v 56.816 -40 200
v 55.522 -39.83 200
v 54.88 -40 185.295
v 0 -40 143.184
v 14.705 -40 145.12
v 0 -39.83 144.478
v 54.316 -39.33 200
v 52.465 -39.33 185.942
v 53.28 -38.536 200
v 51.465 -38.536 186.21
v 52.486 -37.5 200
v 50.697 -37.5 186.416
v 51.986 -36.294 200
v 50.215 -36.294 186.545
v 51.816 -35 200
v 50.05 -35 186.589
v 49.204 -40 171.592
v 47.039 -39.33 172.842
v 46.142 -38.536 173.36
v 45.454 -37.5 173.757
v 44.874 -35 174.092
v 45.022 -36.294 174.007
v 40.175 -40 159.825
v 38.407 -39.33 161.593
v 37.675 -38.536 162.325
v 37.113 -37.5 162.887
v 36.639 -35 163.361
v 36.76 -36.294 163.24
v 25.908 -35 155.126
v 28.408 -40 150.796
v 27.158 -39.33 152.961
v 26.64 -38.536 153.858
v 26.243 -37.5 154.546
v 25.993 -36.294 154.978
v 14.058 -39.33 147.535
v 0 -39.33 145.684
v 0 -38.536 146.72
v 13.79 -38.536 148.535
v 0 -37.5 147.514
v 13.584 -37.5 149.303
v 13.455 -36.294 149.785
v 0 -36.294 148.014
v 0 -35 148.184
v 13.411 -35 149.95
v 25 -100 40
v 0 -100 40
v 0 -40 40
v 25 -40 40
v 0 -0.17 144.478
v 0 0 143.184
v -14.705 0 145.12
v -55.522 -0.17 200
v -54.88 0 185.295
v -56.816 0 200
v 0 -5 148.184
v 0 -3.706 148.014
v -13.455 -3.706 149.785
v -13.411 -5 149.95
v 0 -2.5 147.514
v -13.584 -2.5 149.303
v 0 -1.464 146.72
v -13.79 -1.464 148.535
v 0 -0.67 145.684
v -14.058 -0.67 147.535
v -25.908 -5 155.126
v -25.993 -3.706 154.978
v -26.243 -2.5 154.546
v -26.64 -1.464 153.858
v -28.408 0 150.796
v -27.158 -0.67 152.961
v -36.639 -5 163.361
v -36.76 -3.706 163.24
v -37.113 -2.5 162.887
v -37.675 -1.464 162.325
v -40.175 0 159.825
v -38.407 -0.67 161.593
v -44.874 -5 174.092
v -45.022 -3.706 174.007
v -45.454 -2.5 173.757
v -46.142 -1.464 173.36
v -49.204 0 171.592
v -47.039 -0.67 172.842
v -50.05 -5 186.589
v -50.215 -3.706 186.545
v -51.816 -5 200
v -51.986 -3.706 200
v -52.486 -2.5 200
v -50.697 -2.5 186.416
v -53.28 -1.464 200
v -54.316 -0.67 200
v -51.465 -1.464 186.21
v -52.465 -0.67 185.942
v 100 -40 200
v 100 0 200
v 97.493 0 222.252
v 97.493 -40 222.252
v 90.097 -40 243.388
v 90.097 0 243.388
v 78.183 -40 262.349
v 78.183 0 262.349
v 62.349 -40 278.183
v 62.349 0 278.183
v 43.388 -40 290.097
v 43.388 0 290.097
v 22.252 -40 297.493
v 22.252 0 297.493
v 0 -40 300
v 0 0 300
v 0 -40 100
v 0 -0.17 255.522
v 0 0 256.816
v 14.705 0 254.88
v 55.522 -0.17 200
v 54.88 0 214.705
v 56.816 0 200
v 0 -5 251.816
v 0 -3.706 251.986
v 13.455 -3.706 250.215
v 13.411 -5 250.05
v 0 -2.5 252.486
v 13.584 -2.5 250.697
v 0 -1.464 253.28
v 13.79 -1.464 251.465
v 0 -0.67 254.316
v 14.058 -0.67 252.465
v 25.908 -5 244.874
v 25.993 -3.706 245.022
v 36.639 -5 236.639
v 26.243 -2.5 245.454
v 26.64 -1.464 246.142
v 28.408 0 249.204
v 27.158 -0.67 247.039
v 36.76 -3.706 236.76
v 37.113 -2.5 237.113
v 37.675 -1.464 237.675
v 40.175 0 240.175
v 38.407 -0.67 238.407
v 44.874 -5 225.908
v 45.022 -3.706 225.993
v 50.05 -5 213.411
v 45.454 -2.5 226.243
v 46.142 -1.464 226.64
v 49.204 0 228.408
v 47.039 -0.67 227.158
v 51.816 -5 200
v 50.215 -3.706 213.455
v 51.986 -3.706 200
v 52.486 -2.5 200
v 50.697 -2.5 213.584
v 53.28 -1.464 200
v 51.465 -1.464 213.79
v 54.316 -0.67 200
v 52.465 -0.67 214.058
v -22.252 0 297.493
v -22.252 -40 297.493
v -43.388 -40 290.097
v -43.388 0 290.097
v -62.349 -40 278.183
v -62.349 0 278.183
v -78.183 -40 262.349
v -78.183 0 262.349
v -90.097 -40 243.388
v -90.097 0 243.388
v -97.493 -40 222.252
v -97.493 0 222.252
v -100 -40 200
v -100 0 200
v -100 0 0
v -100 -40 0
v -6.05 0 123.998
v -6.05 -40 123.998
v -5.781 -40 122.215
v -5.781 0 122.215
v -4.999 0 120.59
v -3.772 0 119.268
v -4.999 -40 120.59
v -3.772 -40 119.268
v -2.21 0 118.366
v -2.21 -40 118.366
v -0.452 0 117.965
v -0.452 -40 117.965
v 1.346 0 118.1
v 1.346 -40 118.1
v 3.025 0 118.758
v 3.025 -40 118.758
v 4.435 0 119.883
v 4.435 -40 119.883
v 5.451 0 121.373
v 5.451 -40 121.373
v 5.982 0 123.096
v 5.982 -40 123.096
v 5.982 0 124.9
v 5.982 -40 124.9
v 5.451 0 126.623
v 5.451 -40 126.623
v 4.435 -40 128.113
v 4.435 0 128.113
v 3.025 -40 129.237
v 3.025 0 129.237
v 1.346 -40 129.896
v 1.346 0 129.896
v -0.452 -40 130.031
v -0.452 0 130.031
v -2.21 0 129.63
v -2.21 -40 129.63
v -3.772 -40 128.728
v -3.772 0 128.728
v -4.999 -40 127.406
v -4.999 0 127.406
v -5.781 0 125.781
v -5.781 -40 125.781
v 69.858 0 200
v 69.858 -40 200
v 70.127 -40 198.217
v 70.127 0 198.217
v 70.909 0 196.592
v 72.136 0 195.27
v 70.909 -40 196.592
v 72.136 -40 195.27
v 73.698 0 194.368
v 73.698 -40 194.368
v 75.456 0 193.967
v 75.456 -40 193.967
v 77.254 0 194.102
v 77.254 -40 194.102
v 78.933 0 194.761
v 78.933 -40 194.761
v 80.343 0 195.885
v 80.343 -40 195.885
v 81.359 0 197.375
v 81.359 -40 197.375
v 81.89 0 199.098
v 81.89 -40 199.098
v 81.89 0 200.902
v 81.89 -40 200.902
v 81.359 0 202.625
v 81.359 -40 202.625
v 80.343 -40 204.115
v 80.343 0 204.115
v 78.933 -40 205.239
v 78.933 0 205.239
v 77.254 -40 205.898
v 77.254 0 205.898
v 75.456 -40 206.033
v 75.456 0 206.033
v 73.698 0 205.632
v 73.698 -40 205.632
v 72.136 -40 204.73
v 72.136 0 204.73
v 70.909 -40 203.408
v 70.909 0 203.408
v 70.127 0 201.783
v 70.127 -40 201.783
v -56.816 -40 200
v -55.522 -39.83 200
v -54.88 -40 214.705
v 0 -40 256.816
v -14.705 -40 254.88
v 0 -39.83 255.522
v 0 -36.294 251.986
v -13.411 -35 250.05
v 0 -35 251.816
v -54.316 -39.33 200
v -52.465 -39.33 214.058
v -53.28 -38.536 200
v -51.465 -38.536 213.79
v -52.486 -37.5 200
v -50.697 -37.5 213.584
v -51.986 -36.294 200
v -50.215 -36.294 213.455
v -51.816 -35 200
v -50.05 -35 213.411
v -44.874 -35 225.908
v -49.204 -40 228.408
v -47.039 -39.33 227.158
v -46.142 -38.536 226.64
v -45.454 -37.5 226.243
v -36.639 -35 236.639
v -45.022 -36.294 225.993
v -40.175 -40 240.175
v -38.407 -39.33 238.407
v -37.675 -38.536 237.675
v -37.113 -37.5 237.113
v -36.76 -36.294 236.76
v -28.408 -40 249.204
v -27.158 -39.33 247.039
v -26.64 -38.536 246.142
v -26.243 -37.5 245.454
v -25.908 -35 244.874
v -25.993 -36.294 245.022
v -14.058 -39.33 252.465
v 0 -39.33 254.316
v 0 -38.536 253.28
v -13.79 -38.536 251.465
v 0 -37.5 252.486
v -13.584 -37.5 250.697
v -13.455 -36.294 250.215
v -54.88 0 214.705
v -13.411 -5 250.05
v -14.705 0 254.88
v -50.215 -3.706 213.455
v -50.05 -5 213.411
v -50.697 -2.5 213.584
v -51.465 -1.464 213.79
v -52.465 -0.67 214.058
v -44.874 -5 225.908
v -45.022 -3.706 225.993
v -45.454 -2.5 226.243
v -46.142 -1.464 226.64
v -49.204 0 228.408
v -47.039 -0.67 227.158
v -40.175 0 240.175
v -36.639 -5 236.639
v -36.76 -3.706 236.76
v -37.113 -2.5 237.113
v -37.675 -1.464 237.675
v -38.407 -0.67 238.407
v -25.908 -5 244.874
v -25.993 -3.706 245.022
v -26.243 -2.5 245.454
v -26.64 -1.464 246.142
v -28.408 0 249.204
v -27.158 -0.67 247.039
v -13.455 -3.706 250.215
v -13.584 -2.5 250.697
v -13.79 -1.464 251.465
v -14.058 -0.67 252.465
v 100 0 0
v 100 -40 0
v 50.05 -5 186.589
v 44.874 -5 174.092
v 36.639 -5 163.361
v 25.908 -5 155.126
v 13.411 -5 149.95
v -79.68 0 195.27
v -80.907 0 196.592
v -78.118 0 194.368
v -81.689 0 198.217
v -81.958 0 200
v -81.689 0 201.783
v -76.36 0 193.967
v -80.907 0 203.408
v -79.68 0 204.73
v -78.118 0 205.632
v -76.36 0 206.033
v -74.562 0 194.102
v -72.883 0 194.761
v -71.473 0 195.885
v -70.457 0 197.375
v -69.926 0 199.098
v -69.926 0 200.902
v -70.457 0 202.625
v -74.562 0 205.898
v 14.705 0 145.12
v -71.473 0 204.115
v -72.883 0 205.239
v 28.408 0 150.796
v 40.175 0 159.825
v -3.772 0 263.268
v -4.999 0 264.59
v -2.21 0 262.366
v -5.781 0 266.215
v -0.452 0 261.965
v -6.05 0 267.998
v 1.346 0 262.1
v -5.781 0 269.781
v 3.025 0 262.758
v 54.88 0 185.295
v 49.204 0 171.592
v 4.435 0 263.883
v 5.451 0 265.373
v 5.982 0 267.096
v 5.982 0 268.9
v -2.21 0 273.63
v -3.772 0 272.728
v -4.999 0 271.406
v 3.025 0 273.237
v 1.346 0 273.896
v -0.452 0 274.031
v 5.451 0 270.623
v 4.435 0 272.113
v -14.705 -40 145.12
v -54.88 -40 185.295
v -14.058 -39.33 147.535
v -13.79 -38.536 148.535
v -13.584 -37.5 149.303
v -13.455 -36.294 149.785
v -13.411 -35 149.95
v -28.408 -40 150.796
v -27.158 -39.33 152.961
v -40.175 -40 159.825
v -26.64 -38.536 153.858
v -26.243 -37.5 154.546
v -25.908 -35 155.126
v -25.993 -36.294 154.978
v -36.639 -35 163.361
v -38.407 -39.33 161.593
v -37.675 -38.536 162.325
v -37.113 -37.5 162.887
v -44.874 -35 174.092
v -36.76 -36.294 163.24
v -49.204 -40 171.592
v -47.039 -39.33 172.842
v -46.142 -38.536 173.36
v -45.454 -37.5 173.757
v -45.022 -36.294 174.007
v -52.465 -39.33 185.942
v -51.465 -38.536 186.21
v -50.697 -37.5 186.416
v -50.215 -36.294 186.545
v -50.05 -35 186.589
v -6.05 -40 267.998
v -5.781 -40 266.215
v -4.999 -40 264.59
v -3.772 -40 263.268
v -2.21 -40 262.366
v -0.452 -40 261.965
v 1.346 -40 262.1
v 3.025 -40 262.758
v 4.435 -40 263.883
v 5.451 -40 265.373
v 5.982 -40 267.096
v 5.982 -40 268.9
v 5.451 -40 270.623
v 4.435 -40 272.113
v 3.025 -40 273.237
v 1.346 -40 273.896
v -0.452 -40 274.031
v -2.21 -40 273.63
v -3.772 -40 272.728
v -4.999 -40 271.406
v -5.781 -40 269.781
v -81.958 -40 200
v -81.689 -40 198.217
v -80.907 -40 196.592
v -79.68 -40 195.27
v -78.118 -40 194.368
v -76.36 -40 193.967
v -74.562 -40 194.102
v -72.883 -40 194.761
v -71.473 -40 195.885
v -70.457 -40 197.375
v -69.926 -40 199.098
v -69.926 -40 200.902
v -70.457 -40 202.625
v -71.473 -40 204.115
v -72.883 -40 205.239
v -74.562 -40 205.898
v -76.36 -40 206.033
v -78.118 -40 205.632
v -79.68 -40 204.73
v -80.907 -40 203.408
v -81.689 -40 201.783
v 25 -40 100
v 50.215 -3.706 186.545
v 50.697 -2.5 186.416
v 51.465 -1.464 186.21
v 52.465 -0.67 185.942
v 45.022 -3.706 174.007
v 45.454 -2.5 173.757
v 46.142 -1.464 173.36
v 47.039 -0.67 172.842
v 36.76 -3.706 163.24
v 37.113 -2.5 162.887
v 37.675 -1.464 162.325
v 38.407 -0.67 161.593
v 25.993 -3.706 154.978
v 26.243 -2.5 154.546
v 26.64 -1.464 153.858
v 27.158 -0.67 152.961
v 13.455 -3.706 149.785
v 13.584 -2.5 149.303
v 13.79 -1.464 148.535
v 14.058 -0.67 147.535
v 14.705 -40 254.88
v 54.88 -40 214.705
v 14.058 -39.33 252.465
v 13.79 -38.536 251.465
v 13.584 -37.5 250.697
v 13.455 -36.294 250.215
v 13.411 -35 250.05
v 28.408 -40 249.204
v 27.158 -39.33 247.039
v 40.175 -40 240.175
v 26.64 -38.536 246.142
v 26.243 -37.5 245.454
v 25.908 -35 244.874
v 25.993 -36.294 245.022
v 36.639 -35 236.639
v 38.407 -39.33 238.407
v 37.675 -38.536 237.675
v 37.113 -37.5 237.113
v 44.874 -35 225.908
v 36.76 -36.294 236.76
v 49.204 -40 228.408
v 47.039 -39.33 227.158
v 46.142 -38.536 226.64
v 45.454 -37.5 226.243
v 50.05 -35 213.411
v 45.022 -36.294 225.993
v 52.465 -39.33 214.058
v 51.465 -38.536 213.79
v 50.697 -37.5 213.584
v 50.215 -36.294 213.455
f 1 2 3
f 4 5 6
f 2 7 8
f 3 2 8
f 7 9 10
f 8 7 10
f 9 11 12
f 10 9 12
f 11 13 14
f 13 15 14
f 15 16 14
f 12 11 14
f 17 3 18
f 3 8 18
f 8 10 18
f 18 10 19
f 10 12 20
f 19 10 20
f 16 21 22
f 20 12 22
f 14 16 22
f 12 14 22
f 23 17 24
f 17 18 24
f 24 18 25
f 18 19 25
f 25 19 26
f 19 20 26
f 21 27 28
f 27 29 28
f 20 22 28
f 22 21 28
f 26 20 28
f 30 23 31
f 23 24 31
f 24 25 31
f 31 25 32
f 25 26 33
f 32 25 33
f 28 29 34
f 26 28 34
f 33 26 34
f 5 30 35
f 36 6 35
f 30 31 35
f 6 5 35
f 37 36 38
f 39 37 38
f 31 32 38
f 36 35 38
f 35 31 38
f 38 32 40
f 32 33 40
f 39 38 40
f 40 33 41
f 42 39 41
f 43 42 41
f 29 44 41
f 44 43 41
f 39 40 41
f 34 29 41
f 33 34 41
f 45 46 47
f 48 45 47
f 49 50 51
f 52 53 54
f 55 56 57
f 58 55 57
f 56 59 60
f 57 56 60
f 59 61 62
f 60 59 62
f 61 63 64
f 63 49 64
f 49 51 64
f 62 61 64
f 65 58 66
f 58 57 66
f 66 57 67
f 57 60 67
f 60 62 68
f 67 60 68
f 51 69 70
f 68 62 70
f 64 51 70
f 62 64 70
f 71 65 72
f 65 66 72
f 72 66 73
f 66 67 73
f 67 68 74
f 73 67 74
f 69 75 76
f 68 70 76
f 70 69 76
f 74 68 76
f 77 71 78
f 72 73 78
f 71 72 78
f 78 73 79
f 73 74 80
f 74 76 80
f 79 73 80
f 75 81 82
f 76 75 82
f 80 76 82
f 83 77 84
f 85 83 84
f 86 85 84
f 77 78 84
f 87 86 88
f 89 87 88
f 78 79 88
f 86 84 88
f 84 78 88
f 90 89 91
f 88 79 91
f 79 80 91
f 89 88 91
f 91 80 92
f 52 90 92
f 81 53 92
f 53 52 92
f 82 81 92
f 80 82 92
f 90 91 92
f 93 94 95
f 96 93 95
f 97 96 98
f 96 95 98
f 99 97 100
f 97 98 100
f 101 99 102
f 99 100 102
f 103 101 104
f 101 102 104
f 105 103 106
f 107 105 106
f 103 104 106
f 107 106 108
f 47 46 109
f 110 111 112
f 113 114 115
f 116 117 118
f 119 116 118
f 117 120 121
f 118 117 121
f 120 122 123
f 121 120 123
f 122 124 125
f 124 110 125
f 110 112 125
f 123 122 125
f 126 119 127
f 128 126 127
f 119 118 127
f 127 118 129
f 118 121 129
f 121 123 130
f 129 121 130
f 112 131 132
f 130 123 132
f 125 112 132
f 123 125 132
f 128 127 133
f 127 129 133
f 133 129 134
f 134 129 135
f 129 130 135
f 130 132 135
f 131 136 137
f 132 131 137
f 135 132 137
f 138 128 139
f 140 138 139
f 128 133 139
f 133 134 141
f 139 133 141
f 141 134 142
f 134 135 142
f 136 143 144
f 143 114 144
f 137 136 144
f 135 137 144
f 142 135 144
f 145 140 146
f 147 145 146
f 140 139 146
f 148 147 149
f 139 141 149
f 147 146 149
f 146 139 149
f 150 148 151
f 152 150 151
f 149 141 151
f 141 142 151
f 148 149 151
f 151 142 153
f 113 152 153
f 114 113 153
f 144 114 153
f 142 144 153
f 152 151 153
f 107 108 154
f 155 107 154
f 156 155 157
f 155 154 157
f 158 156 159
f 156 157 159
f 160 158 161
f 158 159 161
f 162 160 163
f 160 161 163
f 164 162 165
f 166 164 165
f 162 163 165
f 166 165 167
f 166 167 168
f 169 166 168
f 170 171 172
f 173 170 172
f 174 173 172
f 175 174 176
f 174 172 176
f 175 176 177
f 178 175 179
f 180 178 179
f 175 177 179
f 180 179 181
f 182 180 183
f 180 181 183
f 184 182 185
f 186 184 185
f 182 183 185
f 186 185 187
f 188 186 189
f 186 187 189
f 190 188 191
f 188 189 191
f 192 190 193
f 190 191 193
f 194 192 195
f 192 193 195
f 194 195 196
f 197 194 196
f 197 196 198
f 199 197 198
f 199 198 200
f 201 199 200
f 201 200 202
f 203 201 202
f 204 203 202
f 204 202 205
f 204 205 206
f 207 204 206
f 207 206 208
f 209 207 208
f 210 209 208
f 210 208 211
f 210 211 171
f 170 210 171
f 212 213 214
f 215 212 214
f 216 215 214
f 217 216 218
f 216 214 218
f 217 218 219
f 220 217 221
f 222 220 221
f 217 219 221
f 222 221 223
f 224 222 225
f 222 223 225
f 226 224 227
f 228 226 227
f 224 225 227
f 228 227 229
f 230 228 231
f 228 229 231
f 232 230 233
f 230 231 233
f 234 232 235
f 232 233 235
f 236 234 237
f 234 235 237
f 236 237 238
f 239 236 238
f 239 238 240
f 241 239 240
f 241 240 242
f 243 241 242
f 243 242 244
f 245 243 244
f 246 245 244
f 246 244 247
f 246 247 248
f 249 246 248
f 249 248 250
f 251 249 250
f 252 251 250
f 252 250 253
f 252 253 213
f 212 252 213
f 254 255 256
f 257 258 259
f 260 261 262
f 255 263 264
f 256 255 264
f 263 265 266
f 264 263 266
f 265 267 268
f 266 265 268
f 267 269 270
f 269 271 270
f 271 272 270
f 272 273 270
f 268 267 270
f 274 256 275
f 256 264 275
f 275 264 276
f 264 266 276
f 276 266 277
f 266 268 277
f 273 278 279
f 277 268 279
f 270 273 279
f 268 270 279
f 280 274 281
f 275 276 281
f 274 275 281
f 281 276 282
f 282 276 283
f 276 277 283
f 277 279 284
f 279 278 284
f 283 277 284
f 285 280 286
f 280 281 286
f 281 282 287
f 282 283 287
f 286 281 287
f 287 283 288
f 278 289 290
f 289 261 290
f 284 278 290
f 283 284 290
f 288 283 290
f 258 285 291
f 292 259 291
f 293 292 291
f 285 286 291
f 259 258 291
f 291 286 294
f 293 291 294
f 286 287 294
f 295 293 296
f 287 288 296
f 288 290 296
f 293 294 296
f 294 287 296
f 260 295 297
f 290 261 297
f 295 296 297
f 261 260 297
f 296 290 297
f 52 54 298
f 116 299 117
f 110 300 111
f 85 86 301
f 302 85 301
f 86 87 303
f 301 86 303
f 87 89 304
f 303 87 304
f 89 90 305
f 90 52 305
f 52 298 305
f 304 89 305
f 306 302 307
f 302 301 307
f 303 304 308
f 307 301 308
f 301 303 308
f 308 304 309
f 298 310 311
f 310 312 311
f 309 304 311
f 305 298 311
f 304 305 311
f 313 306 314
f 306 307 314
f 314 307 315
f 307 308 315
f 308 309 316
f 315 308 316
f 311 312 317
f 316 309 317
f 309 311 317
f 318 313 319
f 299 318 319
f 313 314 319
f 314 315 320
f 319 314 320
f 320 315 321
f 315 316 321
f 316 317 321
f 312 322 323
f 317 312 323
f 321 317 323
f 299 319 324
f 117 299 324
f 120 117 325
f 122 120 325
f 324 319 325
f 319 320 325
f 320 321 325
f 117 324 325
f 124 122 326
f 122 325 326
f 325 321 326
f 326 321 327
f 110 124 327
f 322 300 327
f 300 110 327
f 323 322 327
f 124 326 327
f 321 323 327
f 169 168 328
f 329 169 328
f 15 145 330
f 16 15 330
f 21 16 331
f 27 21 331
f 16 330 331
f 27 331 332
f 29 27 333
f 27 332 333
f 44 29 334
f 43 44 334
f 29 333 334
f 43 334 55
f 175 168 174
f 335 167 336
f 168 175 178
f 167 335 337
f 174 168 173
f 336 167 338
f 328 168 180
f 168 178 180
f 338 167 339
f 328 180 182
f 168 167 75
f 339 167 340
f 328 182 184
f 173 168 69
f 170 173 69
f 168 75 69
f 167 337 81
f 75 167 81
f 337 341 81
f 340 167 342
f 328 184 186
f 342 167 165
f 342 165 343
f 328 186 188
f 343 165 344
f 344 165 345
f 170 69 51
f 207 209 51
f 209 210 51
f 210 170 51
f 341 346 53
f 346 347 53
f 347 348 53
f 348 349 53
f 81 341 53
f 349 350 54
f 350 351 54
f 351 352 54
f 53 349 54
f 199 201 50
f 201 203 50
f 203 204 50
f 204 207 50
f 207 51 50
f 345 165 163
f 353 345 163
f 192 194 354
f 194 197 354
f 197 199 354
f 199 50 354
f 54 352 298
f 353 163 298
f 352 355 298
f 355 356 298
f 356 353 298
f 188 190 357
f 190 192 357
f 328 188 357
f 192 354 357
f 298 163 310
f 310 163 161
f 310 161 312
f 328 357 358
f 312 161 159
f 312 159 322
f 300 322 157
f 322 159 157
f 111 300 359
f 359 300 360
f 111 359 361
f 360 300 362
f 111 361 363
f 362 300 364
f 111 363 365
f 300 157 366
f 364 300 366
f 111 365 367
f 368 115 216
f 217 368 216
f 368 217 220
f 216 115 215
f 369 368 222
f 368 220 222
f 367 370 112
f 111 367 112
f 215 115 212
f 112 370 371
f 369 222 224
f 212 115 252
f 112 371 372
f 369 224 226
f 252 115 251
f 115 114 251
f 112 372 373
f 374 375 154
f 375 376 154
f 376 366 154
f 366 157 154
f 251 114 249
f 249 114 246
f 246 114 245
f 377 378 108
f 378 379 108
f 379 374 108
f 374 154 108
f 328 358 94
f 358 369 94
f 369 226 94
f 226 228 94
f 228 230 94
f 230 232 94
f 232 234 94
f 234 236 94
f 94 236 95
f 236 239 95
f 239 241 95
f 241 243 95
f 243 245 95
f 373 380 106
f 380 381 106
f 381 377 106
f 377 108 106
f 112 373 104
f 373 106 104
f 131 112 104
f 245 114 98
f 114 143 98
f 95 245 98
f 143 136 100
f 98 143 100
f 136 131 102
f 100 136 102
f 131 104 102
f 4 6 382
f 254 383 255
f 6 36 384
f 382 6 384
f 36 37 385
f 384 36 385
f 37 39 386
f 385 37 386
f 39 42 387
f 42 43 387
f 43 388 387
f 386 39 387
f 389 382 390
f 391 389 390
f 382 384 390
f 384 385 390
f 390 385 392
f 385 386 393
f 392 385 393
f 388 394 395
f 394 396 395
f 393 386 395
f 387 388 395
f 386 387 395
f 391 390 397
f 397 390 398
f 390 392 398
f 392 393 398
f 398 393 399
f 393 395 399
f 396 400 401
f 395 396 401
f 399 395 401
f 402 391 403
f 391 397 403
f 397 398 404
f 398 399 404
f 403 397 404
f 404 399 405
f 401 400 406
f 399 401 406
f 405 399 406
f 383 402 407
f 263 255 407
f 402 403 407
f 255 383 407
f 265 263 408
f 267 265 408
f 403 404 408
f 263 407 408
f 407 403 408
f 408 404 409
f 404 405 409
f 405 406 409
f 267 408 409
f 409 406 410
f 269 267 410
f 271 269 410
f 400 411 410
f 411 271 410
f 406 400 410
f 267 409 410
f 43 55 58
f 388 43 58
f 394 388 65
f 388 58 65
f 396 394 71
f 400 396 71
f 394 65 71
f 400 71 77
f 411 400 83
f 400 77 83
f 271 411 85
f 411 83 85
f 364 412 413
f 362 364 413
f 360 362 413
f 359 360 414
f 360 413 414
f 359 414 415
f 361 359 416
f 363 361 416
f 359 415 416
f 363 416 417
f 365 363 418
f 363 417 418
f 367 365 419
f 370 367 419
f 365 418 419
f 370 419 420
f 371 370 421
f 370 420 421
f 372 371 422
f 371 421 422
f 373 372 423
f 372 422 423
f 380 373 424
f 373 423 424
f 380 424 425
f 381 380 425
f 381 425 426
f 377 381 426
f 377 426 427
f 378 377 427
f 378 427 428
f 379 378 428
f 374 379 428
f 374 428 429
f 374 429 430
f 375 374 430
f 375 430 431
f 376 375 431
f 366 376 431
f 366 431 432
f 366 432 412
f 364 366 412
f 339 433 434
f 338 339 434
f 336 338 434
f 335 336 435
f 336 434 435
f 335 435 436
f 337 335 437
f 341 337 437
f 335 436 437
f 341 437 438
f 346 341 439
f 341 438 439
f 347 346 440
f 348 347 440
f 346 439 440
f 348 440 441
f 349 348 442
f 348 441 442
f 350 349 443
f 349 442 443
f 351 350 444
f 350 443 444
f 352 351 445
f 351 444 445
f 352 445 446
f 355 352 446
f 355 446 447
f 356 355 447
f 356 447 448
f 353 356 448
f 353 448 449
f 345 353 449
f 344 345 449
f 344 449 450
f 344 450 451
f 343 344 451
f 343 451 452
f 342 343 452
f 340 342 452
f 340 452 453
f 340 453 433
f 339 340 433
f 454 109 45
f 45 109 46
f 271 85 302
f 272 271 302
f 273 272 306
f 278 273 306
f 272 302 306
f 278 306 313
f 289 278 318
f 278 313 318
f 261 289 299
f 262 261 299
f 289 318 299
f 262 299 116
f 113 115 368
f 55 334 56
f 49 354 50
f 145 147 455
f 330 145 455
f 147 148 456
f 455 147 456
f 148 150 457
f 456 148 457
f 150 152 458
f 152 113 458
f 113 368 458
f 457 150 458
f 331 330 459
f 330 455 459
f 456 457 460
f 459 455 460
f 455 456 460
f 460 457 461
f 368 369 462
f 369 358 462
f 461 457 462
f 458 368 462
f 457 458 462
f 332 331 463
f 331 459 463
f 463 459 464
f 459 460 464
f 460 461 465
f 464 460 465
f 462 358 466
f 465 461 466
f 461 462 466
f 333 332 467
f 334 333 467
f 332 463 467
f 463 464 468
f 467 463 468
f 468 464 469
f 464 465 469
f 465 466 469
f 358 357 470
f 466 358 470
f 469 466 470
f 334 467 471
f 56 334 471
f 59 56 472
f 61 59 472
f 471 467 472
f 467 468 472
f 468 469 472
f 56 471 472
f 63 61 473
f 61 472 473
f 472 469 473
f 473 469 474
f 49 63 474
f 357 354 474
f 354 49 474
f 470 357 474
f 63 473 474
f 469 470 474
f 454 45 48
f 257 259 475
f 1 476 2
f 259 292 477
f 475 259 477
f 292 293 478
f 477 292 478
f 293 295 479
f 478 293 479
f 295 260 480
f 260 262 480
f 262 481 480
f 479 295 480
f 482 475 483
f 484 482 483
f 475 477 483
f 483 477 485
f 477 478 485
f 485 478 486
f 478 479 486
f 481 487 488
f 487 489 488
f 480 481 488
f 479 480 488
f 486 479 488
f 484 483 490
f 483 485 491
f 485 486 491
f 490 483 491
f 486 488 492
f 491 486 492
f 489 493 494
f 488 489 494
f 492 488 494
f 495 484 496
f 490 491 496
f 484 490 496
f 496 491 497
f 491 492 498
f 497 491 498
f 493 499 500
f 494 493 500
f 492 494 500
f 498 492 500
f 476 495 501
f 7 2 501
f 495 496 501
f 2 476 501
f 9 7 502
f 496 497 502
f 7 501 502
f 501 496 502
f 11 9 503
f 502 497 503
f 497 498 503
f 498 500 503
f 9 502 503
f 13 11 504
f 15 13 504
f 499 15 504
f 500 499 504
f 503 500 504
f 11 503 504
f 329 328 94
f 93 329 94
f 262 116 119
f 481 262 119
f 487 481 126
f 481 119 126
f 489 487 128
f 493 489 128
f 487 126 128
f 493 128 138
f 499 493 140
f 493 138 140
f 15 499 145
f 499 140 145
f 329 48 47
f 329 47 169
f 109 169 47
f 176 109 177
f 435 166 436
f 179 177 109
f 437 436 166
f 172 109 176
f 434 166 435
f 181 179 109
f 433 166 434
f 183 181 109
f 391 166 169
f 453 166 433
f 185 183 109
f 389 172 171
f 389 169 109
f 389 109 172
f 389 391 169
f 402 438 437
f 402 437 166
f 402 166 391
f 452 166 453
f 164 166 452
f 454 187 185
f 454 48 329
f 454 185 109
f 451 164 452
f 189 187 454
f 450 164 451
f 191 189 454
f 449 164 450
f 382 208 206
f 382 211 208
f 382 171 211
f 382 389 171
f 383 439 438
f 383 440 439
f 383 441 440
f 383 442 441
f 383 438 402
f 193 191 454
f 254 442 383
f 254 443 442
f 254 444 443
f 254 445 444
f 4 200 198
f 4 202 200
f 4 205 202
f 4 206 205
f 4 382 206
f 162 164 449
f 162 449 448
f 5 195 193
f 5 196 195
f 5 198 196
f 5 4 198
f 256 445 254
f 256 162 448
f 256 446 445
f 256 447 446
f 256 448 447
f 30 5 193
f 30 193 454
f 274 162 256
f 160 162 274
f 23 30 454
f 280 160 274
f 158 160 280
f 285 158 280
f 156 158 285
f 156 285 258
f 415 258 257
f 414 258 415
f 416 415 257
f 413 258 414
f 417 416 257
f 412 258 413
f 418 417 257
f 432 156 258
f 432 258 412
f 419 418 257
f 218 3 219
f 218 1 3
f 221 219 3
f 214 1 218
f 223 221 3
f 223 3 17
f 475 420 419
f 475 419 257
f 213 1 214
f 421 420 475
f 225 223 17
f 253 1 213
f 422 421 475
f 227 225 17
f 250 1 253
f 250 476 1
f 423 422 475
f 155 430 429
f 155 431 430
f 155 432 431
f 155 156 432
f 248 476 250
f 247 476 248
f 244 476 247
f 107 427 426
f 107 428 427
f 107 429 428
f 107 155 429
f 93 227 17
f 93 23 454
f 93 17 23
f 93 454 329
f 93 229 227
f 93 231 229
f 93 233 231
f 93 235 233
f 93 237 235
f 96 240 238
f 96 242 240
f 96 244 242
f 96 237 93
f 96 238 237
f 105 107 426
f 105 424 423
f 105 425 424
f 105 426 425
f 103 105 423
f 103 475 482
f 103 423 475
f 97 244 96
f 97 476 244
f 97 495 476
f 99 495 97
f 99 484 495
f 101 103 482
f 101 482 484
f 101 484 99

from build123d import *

# Parameters (mm, degrees)
F1_DEPTH = 40
F2_D     = 12.1
F3_R     = 5
F4_R     = 5
F6_DEPTH = 25


with BuildPart() as f1:
    # F0 (on Front) → F1 (new body)
    with BuildSketch(Plane.XZ):
        with BuildLine():
            Line((-100, 0), (0, 0))
            Line((0, 0), (0, 100))
            ThreePointArc((0, 100), (-70.7106781187, 129.2893218813), (-100, 200))
            Line((-100, 200), (-100, 0))
        make_face()
        with BuildLine():
            Line((0, 100), (0, 0))
            Line((0, 0), (100, 0))
            Line((100, 0), (100, 200))
            ThreePointArc((100, 200), (70.7106781187, 129.2893218813), (0, 100))
        make_face()
        with BuildLine():
            ThreePointArc((-100, 200), (-70.7106781187, 129.2893218813), (0, 100))
            Line((0, 100), (0, 148.1840150042))
            ThreePointArc((0, 148.1840150042), (-36.6394343644, 163.3605656356), (-51.8159849958, 200))
            Line((-51.8159849958, 200), (-100, 200))
        make_face()
        with BuildLine():
            Line((0, 148.1840150042), (0, 100))
            ThreePointArc((0, 100), (70.7106781187, 129.2893218813), (100, 200))
            Line((100, 200), (51.8159849958, 200))
            ThreePointArc((51.8159849958, 200), (36.6394343644, 163.3605656356), (0, 148.1840150042))
        make_face()
        with BuildLine():
            ThreePointArc((0, 300), (-70.7106781187, 270.7106781187), (-100, 200))
            Line((-100, 200), (-51.8159849958, 200))
            ThreePointArc((-51.8159849958, 200), (-36.6394343644, 236.6394343644), (0, 251.8159849958))
            Line((0, 251.8159849958), (0, 300))
        make_face()
        with BuildLine():
            Line((51.8159849958, 200), (100, 200))
            ThreePointArc((100, 200), (70.7106781187, 270.7106781187), (0, 300))
            Line((0, 300), (0, 251.8159849958))
            ThreePointArc((0, 251.8159849958), (36.6394343644, 236.6394343644), (51.8159849958, 200))
        make_face()
    extrude(amount=F1_DEPTH)

    # F2 (through all)
    with Locations(Plane(origin=(0, 0, 0), x_dir=(1, 0, 0), z_dir=(0, 1, 0))):
        with Locations((-75.9079924979, -200), (0, -267.9978298545), (75.9079924979, -200), (0, -123.9978298545)):
            Hole(F2_D / 2)

    # F3
    f3_edges = [f1.edges().sort_by_distance(p)[0] for p in [
        (0, -40, 148.184015),
    ]]
    fillet(f3_edges, radius=F3_R)

    # F4
    f4_edges = [f1.edges().sort_by_distance(p)[0] for p in [
        (0, 0, 148.184015),
    ]]
    fillet(f4_edges, radius=F4_R)

    # F5 (on Right) → F6 (join)
    with BuildSketch(Plane.YZ):
        Polygon((-100, 40), (-40, 40), (-40, 100), align=None)
    extrude(amount=F6_DEPTH)


solid = f1.part
